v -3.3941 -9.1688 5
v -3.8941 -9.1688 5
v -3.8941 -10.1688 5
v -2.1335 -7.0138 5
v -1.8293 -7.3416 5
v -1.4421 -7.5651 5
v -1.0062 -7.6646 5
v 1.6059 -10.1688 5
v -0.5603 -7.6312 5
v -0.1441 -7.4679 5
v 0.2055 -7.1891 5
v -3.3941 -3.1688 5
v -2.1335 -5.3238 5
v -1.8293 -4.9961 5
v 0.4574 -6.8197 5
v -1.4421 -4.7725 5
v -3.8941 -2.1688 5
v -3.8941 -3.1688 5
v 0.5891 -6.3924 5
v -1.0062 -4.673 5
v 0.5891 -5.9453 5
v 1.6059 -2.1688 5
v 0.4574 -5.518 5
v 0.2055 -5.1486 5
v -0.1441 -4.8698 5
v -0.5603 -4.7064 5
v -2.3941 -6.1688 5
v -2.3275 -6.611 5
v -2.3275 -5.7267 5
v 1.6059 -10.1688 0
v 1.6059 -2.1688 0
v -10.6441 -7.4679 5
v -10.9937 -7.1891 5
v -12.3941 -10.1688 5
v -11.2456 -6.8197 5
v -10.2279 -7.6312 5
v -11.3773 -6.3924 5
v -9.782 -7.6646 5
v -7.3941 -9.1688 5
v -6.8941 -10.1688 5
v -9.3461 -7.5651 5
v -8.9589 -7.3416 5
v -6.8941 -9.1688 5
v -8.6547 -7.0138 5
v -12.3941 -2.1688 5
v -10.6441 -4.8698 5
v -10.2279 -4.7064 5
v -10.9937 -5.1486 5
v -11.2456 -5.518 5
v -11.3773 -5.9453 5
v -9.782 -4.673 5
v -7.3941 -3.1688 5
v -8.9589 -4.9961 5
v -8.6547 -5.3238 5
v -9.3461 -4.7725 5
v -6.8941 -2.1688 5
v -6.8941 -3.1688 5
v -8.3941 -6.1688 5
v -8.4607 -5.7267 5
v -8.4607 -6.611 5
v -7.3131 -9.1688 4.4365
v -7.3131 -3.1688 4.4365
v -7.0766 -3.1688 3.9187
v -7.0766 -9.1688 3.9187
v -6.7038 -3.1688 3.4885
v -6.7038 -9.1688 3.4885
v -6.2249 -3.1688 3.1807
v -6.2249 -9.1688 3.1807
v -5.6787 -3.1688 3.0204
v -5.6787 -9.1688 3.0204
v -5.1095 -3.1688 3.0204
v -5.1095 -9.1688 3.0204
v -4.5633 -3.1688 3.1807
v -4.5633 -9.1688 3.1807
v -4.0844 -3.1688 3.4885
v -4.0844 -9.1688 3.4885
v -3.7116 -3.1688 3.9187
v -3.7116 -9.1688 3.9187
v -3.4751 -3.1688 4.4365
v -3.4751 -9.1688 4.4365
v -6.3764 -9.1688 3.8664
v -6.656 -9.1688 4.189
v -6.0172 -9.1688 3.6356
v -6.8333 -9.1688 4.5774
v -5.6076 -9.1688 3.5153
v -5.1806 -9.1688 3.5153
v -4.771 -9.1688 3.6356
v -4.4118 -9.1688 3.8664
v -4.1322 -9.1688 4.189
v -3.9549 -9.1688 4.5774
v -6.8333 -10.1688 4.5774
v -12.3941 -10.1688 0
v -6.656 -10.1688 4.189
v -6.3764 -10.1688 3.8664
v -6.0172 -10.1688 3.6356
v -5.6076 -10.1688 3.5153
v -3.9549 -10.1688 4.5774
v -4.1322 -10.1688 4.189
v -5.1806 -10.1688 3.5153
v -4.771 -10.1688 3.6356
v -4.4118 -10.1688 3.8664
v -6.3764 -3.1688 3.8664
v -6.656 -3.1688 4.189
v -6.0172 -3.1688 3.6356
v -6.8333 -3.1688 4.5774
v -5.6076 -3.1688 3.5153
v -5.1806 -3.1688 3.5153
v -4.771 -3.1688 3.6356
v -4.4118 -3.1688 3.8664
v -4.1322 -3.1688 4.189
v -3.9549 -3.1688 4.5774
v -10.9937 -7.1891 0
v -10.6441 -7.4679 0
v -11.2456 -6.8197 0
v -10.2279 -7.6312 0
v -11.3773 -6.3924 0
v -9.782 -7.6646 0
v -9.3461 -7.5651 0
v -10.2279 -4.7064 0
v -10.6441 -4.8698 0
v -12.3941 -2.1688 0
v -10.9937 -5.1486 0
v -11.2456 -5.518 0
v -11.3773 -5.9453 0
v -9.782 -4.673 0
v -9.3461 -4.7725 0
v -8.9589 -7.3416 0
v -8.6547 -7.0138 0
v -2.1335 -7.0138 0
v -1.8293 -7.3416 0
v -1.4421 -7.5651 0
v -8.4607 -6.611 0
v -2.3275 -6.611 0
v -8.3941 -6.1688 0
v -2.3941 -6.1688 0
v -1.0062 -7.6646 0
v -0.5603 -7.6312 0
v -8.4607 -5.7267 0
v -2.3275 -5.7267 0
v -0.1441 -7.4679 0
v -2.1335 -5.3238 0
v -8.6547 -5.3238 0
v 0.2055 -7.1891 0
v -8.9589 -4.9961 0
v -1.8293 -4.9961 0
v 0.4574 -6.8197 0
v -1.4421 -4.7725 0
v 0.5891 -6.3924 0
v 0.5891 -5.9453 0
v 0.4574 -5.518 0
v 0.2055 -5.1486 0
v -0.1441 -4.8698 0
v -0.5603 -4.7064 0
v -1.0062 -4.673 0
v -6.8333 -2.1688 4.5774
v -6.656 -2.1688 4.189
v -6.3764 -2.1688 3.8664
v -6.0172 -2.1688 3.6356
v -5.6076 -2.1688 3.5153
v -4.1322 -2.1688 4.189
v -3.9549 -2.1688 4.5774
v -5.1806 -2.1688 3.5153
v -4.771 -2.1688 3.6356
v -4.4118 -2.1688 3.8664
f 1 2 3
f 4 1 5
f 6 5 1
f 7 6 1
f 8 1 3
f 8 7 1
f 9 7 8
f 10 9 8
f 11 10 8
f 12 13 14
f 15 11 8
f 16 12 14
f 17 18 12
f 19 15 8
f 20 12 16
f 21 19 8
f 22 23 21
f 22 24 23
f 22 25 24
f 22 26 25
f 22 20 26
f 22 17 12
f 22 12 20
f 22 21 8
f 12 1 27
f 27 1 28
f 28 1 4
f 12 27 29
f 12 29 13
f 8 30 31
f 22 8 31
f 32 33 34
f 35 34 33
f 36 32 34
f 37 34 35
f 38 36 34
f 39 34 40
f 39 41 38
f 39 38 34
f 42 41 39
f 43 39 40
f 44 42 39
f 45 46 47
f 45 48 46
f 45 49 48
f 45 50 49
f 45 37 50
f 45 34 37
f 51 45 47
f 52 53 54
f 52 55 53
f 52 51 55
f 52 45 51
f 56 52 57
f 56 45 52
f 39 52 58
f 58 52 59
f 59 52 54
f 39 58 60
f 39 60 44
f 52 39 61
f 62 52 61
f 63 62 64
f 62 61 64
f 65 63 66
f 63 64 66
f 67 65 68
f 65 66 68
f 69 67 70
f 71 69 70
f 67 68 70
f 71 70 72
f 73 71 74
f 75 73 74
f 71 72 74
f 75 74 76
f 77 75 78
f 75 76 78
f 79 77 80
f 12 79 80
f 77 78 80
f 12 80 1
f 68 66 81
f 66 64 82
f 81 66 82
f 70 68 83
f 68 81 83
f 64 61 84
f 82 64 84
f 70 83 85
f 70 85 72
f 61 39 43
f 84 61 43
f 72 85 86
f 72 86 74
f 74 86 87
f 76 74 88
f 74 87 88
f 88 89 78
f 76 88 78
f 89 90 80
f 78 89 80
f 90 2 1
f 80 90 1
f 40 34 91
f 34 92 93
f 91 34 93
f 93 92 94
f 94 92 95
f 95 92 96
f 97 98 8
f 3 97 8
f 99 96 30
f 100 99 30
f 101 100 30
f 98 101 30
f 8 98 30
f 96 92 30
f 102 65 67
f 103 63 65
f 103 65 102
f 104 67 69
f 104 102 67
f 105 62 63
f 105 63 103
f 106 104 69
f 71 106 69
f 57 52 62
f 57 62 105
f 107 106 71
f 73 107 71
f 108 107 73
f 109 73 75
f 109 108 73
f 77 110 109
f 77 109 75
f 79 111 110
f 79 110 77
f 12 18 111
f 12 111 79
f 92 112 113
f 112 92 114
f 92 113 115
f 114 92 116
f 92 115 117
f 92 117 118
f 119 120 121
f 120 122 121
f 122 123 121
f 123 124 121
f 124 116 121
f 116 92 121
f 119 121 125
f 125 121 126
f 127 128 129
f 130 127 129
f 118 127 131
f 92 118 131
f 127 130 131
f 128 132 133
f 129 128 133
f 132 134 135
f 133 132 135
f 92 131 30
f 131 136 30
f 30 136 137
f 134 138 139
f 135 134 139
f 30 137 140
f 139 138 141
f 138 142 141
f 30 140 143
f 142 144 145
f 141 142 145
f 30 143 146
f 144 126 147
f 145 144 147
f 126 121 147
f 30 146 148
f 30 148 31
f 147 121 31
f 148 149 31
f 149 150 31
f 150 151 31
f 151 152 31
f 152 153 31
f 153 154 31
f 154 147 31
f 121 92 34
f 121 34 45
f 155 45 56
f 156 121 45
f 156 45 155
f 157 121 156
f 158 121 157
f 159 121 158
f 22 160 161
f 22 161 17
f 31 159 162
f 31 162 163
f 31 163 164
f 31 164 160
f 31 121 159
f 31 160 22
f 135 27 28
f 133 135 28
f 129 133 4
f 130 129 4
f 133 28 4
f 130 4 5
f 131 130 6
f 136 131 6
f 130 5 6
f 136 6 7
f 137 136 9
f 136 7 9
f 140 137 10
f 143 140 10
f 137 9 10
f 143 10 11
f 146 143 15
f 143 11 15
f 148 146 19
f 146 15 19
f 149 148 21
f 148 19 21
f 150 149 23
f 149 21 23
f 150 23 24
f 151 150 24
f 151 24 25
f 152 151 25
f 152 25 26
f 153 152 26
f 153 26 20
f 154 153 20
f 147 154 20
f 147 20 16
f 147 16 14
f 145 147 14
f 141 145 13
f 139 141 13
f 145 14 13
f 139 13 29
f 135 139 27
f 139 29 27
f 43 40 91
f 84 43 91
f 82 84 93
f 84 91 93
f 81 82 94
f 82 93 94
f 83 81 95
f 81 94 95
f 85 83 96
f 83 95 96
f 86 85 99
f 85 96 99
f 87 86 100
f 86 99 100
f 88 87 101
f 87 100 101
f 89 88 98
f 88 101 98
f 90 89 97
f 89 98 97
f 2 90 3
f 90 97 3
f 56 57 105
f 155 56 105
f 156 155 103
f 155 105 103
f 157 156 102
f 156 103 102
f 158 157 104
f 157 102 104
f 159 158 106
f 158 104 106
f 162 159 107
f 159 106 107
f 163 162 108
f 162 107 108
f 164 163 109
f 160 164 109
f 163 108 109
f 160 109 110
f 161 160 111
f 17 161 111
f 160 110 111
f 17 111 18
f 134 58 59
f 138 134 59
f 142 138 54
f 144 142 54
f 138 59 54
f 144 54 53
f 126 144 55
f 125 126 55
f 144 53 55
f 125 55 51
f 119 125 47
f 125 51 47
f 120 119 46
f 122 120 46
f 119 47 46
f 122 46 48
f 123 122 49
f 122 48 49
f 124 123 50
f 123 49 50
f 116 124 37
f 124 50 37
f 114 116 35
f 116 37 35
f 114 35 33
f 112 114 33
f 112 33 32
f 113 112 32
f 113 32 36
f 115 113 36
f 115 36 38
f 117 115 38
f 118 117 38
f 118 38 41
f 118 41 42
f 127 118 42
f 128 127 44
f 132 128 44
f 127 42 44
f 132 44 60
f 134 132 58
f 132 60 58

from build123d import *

# Parameters (mm, degrees)
F0_W     = 14
F0_H     = 8
F1_DEPTH = 5
F4_START = -1
F2_R     = 2
F4_DEPTH = 6
F5_DEPTH = 25
F7_DEPTH = 5


with BuildPart() as f1:
    # F0 (on Top) → F1 (new body)
    with BuildSketch(Plane.XY):
        with Locations((-5.3940967023, -6.1688271388)):
            Rectangle(F0_W, F0_H)
    extrude(amount=F1_DEPTH)

    # F2 (on face) → F4 (cut)
    with BuildSketch(Plane.XZ.offset(10.1688271388).offset(F4_START)):
        with Locations((-5.3940967023, 5)):
            Circle(F2_R)
    extrude(amount=-F4_DEPTH, mode=Mode.SUBTRACT)

    # F3 (on face) → F5 (cut)
    with BuildSketch(Plane.XZ.offset(10.1688271388)):
        with BuildLine():
            ThreePointArc((-6.8940967023, 5), (-5.3940967023, 6.5), (-3.8940967023, 5))
            Line((-3.8940967023, 5), (-3.3940967023, 5))
            ThreePointArc((-3.3940967023, 5), (-5.3940967023, 7), (-7.3940967023, 5))
            Line((-7.3940967023, 5), (-6.8940967023, 5))
        make_face()
        with BuildLine():
            ThreePointArc((-6.8940967023, 5), (-5.3940967023, 3.5), (-3.8940967023, 5))
            Line((-3.8940967023, 5), (-6.8940967023, 5))
        make_face()
        with BuildLine():
            Line((-6.8940967023, 5), (-3.8940967023, 5))
            ThreePointArc((-3.8940967023, 5), (-5.3940967023, 6.5), (-6.8940967023, 5))
        make_face()
    extrude(amount=-F5_DEPTH, mode=Mode.SUBTRACT)

    # F6 (on face) → F7 (cut)
    with BuildSketch(Plane.XY.offset(5)):
        with BuildLine():
            ThreePointArc((-11.3940967023, -6.1688271388), (-9.8940967023, -7.6688271388), (-8.3940967023, -6.1688271388))
            Line((-8.3940967023, -6.1688271388), (-11.3940967023, -6.1688271388))
        make_face()
        with BuildLine():
            Line((-11.3940967023, -6.1688271388), (-8.3940967023, -6.1688271388))
            ThreePointArc((-8.3940967023, -6.1688271388), (-9.8940967023, -4.6688271388), (-11.3940967023, -6.1688271388))
        make_face()
        with BuildLine():
            ThreePointArc((0.6059032977, -6.1688271388), (-0.8940967023, -4.6688271388), (-2.3940967023, -6.1688271388))
            Line((-2.3940967023, -6.1688271388), (0.6059032977, -6.1688271388))
        make_face()
        with BuildLine():
            Line((0.6059032977, -6.1688271388), (-2.3940967023, -6.1688271388))
            ThreePointArc((-2.3940967023, -6.1688271388), (-0.8940967023, -7.6688271388), (0.6059032977, -6.1688271388))
        make_face()
    extrude(amount=-F7_DEPTH, mode=Mode.SUBTRACT)


solid = f1.part
